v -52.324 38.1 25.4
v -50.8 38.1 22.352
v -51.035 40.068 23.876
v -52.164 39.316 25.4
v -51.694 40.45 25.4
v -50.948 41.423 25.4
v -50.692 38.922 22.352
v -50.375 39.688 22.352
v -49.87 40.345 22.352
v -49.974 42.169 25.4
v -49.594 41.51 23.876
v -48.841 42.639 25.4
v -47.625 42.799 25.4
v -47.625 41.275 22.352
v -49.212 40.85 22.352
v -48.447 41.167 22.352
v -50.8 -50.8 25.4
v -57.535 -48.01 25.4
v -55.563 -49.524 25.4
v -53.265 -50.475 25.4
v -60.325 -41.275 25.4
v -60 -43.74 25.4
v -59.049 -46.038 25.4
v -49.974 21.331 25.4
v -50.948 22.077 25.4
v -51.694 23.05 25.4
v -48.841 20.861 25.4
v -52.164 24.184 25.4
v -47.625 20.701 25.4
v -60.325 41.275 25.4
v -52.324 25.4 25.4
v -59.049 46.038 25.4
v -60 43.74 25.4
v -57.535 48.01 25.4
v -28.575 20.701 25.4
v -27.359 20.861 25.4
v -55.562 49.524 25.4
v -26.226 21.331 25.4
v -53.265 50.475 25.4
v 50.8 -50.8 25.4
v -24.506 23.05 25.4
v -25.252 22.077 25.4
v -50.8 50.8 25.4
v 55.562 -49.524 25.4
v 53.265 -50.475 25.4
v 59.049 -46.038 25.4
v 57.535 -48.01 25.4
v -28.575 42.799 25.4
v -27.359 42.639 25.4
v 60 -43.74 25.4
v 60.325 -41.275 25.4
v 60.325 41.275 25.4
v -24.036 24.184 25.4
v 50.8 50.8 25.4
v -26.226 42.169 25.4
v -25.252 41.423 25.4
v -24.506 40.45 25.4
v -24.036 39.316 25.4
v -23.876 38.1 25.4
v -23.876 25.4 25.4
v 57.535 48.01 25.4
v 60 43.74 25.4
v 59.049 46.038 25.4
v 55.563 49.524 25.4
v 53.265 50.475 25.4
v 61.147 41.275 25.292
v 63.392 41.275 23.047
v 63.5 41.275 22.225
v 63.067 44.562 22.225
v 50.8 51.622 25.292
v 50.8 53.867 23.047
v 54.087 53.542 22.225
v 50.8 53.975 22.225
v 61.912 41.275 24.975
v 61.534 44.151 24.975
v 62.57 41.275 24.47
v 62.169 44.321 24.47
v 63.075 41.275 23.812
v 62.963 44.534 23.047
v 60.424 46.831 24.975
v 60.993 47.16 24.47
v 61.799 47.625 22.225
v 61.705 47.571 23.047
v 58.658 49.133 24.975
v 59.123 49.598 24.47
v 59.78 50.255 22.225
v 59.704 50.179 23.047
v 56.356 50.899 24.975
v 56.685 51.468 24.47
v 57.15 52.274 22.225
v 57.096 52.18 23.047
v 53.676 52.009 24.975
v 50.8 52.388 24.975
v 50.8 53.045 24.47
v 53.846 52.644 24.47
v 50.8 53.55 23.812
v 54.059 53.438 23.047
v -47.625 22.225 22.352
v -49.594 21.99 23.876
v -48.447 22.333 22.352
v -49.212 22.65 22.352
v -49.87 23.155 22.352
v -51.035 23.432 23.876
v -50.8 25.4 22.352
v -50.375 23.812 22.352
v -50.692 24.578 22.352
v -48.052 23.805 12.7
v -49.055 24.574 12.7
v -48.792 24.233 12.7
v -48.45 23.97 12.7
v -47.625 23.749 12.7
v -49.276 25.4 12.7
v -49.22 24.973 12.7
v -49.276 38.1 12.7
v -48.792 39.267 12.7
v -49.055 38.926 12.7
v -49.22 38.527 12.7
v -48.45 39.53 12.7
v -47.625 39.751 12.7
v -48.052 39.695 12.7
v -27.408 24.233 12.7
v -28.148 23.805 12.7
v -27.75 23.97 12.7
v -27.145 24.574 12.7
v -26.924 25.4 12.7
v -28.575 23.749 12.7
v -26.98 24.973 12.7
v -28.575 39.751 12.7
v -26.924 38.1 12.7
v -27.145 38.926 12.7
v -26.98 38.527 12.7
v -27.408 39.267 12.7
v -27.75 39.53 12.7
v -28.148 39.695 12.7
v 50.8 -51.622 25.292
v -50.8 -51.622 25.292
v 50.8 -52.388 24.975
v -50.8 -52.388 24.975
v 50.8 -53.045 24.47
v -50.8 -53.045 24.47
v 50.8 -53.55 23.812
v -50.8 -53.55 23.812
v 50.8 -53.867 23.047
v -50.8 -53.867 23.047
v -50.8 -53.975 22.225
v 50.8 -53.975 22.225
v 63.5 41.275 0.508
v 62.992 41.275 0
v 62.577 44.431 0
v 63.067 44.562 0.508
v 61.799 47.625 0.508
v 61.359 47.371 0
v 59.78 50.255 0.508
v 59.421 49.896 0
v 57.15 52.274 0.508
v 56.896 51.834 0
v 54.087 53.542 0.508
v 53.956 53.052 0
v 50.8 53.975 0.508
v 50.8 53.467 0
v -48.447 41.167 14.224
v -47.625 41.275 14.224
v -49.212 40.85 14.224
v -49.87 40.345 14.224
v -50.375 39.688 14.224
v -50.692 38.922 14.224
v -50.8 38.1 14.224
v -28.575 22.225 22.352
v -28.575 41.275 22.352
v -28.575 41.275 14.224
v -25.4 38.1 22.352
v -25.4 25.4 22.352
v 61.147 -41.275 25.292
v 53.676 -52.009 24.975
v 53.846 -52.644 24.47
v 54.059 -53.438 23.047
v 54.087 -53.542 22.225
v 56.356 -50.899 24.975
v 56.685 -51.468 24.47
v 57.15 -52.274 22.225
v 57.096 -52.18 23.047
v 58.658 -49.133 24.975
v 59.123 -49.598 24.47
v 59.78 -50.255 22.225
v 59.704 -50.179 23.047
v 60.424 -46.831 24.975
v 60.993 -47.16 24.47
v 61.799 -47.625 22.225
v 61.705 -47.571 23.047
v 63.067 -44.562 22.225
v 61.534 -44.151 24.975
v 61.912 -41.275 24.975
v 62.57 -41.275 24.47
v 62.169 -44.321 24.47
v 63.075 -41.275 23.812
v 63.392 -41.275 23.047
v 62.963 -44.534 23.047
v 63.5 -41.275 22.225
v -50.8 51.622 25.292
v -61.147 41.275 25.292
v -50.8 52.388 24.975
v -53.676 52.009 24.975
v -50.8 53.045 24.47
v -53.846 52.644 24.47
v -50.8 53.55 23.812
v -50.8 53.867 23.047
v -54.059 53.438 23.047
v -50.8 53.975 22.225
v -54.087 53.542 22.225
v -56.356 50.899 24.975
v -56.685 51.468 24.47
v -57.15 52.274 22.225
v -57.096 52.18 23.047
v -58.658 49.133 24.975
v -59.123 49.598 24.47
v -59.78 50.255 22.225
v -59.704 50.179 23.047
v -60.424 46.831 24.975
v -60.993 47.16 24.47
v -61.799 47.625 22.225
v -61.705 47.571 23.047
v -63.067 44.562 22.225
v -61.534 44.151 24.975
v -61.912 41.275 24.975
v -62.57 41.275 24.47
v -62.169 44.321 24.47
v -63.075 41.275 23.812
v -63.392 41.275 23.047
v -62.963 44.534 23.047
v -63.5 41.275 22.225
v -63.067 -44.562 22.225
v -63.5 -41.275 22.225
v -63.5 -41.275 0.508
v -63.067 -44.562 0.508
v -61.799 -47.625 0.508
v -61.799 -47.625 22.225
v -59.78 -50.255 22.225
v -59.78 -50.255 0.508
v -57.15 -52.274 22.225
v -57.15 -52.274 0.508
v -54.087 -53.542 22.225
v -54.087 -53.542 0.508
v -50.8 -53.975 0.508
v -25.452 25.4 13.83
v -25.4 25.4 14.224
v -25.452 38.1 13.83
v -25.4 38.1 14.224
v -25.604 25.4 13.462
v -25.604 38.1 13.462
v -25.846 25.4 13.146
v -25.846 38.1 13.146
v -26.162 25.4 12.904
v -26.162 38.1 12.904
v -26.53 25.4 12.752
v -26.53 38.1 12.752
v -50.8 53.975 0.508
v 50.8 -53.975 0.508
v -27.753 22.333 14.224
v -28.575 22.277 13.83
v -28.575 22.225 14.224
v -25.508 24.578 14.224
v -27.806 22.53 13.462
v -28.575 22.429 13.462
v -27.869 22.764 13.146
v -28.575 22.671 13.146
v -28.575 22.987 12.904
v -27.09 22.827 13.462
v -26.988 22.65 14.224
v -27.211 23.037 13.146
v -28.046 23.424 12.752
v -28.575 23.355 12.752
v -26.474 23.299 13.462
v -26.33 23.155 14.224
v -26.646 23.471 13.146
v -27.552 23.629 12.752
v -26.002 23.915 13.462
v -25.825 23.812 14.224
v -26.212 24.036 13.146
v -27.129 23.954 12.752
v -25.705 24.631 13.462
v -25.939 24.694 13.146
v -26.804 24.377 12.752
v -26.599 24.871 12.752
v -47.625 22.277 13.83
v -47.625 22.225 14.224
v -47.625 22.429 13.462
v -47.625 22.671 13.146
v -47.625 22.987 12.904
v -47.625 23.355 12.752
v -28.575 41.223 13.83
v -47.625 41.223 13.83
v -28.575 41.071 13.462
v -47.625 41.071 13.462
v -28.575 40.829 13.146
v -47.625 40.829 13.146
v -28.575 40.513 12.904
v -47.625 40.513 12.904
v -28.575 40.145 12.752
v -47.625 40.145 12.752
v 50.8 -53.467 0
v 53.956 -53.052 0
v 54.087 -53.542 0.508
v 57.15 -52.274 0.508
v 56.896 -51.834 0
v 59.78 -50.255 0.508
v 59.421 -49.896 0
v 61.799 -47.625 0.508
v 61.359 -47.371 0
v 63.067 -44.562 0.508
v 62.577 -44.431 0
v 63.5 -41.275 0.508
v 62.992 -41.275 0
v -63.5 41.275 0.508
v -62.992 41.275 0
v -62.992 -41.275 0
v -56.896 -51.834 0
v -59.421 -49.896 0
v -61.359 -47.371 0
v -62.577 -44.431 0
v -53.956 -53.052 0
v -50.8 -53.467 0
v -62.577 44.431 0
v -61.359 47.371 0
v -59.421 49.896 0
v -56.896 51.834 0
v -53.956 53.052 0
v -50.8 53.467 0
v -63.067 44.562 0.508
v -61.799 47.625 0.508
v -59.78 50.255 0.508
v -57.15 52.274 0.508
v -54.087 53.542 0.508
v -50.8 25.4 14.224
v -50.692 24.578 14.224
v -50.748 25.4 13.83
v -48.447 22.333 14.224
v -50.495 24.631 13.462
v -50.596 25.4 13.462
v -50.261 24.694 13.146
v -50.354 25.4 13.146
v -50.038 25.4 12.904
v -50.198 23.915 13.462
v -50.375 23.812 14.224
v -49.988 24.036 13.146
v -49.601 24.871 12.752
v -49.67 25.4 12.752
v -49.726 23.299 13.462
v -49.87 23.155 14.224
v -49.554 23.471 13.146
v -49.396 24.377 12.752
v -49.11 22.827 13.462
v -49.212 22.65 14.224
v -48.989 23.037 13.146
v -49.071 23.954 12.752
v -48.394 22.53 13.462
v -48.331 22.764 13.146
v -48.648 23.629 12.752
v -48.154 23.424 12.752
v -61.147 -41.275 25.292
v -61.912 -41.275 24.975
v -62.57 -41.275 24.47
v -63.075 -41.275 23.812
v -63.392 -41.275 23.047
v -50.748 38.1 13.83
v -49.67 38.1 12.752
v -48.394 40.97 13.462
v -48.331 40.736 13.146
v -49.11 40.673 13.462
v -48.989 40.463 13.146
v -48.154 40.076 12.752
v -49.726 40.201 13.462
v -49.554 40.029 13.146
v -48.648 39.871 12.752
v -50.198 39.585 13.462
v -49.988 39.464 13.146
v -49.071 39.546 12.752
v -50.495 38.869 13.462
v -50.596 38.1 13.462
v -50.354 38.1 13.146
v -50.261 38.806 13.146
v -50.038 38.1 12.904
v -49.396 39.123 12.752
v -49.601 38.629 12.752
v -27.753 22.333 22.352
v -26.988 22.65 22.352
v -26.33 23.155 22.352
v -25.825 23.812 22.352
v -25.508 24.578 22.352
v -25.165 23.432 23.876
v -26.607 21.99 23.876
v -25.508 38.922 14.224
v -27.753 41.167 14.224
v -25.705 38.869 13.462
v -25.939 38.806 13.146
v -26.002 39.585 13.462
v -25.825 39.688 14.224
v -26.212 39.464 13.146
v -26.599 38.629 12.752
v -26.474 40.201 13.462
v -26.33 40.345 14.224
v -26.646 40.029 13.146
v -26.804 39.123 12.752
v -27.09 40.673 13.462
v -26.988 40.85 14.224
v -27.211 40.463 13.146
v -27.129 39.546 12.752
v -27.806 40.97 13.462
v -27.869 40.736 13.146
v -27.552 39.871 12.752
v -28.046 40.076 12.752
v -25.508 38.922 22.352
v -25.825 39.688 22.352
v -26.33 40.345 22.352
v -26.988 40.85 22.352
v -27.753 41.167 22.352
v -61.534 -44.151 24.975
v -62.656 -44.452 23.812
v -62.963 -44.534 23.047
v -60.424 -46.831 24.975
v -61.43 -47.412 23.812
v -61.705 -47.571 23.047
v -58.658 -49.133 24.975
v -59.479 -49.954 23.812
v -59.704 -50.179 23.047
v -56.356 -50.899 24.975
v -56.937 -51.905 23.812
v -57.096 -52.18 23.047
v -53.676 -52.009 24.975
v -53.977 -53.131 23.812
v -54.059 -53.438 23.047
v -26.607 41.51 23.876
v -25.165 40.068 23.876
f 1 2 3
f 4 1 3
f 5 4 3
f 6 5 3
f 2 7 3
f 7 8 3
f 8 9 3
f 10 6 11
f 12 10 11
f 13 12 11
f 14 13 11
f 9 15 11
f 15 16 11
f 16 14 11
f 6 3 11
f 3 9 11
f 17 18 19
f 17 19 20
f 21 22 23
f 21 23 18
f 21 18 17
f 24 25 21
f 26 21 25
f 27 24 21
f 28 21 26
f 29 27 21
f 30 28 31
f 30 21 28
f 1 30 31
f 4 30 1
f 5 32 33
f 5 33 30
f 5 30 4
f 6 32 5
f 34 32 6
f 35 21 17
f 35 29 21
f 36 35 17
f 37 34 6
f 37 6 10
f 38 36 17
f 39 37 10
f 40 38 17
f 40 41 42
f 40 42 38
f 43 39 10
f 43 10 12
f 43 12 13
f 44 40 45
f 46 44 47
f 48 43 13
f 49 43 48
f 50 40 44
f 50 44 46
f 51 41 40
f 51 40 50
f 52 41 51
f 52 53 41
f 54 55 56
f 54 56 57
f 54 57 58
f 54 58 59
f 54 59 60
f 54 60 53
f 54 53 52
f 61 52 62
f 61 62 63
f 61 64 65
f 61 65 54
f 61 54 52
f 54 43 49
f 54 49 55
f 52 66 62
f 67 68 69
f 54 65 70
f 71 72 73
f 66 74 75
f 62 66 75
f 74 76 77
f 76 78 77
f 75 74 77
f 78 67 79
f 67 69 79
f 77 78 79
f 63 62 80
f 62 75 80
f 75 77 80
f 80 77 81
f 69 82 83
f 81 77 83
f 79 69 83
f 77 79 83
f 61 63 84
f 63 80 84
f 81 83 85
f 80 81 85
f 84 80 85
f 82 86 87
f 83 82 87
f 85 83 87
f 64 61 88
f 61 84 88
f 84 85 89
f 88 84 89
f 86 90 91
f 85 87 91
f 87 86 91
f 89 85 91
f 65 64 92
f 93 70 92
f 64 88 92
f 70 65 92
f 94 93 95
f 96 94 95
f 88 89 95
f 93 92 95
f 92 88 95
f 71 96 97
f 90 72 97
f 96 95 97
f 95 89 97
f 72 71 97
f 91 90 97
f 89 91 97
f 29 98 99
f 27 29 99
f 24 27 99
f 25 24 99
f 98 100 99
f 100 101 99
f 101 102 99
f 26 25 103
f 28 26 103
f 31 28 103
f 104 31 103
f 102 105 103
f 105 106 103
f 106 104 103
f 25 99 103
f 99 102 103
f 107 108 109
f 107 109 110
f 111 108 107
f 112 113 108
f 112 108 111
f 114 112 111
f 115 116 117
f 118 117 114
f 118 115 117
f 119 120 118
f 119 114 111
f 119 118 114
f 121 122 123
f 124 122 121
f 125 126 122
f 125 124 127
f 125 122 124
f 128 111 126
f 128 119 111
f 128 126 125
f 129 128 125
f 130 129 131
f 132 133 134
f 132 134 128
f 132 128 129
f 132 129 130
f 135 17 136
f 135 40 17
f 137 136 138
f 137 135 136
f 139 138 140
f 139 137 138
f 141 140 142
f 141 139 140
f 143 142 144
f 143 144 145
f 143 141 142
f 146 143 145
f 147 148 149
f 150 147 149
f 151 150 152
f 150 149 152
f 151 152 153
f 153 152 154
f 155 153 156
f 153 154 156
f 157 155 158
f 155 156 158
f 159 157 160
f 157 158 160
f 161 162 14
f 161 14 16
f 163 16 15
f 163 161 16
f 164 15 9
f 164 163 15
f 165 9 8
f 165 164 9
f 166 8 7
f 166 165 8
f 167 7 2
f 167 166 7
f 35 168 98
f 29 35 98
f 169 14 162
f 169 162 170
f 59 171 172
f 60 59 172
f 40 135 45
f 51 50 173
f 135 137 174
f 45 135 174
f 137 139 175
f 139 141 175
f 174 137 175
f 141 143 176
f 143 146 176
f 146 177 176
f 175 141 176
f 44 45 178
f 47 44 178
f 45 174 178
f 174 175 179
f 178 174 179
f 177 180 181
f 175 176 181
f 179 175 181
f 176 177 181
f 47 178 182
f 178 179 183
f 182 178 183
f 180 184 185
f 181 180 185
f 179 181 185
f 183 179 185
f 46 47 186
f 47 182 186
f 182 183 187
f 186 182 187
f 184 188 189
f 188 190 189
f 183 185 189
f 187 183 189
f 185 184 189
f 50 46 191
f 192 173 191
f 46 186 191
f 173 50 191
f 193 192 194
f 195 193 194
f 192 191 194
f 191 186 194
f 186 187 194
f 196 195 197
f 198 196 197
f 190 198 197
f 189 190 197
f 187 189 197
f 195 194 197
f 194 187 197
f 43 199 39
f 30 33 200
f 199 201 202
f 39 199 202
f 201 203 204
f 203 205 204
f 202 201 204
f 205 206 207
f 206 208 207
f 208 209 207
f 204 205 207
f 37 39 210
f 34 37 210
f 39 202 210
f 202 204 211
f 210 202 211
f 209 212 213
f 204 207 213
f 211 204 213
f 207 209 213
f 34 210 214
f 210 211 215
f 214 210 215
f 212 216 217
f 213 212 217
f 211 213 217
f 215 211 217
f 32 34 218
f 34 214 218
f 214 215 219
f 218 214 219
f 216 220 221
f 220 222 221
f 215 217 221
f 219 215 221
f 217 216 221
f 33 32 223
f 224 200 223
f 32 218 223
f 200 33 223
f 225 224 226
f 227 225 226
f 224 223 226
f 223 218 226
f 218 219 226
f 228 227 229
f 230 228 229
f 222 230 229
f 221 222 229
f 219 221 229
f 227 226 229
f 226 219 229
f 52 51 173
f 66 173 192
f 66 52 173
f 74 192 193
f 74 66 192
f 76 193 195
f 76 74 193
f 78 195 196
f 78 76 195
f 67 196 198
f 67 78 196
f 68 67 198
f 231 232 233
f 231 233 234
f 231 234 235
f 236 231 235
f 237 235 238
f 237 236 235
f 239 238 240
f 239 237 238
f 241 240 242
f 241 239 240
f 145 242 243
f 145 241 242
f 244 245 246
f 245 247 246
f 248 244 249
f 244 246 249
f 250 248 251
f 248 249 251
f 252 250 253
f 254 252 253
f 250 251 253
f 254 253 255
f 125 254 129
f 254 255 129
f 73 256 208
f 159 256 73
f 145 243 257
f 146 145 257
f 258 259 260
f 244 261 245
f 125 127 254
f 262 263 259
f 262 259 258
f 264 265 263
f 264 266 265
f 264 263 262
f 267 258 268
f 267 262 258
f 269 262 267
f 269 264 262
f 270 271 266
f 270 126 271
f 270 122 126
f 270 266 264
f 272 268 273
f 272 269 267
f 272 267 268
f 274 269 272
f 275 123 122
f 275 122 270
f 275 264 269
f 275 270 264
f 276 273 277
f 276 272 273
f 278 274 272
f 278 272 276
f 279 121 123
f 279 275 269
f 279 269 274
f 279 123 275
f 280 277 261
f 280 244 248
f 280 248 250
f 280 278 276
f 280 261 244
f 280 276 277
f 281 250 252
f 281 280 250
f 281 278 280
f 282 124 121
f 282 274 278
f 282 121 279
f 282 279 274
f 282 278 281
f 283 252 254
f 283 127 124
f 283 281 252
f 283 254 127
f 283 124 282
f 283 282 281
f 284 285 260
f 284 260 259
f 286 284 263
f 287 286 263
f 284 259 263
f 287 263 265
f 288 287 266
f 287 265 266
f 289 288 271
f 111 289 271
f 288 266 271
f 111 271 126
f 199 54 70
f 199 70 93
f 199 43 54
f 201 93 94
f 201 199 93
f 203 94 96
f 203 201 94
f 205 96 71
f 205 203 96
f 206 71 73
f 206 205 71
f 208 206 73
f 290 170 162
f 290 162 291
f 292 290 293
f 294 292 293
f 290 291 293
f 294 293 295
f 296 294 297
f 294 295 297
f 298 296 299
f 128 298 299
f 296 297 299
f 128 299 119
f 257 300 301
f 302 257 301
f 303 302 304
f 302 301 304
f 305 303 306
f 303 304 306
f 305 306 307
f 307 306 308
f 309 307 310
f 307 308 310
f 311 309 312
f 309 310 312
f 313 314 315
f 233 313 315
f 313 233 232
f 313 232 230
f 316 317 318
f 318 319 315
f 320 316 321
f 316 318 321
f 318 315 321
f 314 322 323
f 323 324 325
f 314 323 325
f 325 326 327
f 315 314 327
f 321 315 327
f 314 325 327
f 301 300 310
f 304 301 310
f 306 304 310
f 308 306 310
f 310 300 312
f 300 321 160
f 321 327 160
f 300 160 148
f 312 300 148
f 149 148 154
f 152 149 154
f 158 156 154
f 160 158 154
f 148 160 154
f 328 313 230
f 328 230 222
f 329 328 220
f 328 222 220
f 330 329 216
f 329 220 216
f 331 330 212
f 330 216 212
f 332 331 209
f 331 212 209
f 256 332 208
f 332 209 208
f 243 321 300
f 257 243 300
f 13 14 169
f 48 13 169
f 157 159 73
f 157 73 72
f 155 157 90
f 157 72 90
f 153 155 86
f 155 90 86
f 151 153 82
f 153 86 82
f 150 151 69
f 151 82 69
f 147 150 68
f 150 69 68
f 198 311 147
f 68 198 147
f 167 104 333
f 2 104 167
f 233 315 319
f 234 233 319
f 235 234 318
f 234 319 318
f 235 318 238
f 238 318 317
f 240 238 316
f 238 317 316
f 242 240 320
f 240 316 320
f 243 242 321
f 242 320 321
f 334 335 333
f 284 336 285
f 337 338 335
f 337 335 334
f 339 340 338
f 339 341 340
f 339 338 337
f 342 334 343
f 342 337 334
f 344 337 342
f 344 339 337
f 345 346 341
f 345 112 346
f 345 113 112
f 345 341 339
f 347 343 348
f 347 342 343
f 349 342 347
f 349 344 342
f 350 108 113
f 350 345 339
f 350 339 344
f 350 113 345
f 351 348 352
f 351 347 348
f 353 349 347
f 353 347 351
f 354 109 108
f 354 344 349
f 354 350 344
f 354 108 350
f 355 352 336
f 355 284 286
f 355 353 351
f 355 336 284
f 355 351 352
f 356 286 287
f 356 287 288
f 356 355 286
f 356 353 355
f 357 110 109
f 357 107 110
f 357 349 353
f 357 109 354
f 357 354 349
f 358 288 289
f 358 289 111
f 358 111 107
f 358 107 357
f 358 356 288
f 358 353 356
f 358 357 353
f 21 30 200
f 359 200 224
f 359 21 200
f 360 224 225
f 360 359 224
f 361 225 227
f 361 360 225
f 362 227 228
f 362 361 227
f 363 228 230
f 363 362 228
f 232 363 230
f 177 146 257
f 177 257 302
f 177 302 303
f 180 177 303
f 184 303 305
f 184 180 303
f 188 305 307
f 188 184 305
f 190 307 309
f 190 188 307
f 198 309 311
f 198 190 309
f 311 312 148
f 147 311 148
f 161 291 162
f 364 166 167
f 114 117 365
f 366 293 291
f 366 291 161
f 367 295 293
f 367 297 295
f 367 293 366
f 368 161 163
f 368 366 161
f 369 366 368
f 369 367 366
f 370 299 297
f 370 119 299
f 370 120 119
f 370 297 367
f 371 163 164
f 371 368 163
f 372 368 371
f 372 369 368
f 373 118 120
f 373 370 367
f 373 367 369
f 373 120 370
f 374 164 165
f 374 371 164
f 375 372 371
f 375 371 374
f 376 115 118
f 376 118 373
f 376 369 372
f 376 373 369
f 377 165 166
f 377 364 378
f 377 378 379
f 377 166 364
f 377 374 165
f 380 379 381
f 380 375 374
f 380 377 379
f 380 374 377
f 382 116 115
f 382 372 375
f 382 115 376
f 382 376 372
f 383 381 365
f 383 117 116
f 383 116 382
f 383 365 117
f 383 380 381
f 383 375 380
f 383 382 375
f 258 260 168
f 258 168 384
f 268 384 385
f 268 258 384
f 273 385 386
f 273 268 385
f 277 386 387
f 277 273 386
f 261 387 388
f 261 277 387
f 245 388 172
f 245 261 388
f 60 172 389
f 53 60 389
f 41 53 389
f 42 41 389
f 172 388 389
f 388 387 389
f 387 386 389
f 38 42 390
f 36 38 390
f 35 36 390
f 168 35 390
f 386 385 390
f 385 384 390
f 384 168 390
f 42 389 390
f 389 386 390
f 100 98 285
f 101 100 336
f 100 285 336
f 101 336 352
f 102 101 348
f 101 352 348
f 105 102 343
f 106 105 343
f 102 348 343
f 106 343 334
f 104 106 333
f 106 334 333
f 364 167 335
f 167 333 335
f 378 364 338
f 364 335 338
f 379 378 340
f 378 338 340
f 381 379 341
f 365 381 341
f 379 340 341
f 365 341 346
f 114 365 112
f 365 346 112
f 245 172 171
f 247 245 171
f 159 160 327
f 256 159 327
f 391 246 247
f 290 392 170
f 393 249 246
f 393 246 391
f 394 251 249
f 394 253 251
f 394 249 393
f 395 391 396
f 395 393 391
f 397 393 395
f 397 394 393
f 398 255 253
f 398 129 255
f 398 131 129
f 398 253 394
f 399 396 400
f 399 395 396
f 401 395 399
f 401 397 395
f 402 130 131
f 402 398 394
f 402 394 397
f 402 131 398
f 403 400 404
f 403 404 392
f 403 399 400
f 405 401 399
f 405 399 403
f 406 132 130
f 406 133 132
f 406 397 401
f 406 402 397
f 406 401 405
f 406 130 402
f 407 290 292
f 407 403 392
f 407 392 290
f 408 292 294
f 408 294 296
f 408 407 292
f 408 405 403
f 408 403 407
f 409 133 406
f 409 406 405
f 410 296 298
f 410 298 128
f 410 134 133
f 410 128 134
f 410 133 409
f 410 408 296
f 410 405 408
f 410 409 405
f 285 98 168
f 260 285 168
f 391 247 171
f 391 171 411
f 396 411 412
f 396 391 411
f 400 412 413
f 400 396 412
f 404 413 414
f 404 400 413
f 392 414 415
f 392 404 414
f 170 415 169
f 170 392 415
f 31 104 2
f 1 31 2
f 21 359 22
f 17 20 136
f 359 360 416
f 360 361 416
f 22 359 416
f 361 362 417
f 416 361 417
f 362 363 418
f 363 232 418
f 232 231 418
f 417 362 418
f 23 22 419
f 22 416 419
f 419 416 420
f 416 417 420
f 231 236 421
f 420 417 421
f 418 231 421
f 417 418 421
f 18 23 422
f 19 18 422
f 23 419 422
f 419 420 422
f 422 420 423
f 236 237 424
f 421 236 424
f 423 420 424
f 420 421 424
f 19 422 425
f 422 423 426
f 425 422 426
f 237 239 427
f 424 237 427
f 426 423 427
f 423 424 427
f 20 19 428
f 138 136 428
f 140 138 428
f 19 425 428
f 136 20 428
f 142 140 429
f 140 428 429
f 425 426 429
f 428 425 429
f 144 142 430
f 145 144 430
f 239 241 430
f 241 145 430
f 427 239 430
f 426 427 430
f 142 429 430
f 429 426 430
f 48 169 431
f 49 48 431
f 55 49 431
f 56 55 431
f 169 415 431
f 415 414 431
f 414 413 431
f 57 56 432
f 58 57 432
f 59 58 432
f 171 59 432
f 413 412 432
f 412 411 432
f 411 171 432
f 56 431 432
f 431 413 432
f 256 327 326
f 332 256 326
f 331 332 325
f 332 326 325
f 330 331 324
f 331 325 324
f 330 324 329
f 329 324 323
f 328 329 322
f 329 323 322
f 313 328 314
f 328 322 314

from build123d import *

# Parameters (mm, degrees)
F0_W     = 127
F0_H     = 107.95
F1_DEPTH = 25.4
F2_W     = 25.4
F2_H     = 19.05
F3_DEPTH = 12.7
F4_R     = 3.175
F5_R     = 1.524
F6_R     = 12.7
F7_R     = 3.175
F8_SIZE  = 0.508
F9_SIZE2 = 3.048
F9_SIZE  = 1.524


with BuildPart() as f1:
    # F0 (on Top) → F1 (new body)
    with BuildSketch(Plane.XY):
        Rectangle(F0_W, F0_H)
    extrude(amount=F1_DEPTH)

    # F2 (on face) → F3 (cut)
    with BuildSketch(Plane.XY.offset(25.4)):
        with Locations((-38.1, 31.75)):
            Rectangle(F2_W, F2_H)
    extrude(amount=-F3_DEPTH, mode=Mode.SUBTRACT)

    # F4
    f4_edges = [f1.edges().sort_by_distance(p)[0] for p in [
        (-50.8, 41.275, 19.05),
        (-50.8, 22.225, 19.05),
        (-25.4, 22.225, 19.05),
        (-25.4, 41.275, 19.05),
    ]]
    fillet(f4_edges, radius=F4_R)

    # F5
    f5_edges = [f1.edges().sort_by_distance(p)[0] for p in [
        (-38.1, 22.225, 12.7),
    ]]
    fillet(f5_edges, radius=F5_R)

    # F6
    f6_edges = [f1.edges().sort_by_distance(p)[0] for p in [
        (63.5, -53.975, 12.7),
        (63.5, 53.975, 12.7),
        (-63.5, -53.975, 12.7),
        (-63.5, 53.975, 12.7),
    ]]
    fillet(f6_edges, radius=F6_R)

    # F7
    f7_edges = [f1.edges().sort_by_distance(p)[0] for p in [
        (0, -53.975, 25.4),
    ]]
    fillet(f7_edges, radius=F7_R)

    # F8
    f8_edges = [f1.edges().sort_by_distance(p)[0] for p in [
        (0, -53.975, 0),
    ]]
    chamfer(f8_edges, length=F8_SIZE)

    # F9
    f9_edges = [f1.edges().sort_by_distance(p)[0] for p in [
        (-38.1, 41.275, 25.4),
        (-50.8, 38.1, 19.812),
        (-50.8, 31.75, 14.224),
        (-50.8, 31.75, 25.4),
        (-50.8, 25.4, 19.812),
        (-47.625, 41.275, 19.812),
        (-49.870064, 40.345064, 14.224),
        (-49.870064, 40.345064, 25.4),
        (-28.575, 41.275, 19.812),
        (-38.1, 41.275, 14.224),
        (-26.329936, 40.345064, 14.224),
        (-26.329936, 40.345064, 25.4),
        (-25.4, 38.1, 19.812),
        (-25.4, 25.4, 19.812),
        (-25.4, 31.75, 14.224),
        (-25.4, 31.75, 25.4),
        (-26.329936, 23.154936, 14.224),
        (-47.625, 22.225, 19.812),
        (-38.1, 22.225, 14.224),
        (-38.1, 22.225, 25.4),
        (-28.575, 22.225, 19.812),
        (-49.870064, 23.154936, 14.224),
        (-49.870064, 23.154936, 25.4),
    ]]
    chamfer(f9_edges, length=F9_SIZE, length2=F9_SIZE2)


solid = f1.part
